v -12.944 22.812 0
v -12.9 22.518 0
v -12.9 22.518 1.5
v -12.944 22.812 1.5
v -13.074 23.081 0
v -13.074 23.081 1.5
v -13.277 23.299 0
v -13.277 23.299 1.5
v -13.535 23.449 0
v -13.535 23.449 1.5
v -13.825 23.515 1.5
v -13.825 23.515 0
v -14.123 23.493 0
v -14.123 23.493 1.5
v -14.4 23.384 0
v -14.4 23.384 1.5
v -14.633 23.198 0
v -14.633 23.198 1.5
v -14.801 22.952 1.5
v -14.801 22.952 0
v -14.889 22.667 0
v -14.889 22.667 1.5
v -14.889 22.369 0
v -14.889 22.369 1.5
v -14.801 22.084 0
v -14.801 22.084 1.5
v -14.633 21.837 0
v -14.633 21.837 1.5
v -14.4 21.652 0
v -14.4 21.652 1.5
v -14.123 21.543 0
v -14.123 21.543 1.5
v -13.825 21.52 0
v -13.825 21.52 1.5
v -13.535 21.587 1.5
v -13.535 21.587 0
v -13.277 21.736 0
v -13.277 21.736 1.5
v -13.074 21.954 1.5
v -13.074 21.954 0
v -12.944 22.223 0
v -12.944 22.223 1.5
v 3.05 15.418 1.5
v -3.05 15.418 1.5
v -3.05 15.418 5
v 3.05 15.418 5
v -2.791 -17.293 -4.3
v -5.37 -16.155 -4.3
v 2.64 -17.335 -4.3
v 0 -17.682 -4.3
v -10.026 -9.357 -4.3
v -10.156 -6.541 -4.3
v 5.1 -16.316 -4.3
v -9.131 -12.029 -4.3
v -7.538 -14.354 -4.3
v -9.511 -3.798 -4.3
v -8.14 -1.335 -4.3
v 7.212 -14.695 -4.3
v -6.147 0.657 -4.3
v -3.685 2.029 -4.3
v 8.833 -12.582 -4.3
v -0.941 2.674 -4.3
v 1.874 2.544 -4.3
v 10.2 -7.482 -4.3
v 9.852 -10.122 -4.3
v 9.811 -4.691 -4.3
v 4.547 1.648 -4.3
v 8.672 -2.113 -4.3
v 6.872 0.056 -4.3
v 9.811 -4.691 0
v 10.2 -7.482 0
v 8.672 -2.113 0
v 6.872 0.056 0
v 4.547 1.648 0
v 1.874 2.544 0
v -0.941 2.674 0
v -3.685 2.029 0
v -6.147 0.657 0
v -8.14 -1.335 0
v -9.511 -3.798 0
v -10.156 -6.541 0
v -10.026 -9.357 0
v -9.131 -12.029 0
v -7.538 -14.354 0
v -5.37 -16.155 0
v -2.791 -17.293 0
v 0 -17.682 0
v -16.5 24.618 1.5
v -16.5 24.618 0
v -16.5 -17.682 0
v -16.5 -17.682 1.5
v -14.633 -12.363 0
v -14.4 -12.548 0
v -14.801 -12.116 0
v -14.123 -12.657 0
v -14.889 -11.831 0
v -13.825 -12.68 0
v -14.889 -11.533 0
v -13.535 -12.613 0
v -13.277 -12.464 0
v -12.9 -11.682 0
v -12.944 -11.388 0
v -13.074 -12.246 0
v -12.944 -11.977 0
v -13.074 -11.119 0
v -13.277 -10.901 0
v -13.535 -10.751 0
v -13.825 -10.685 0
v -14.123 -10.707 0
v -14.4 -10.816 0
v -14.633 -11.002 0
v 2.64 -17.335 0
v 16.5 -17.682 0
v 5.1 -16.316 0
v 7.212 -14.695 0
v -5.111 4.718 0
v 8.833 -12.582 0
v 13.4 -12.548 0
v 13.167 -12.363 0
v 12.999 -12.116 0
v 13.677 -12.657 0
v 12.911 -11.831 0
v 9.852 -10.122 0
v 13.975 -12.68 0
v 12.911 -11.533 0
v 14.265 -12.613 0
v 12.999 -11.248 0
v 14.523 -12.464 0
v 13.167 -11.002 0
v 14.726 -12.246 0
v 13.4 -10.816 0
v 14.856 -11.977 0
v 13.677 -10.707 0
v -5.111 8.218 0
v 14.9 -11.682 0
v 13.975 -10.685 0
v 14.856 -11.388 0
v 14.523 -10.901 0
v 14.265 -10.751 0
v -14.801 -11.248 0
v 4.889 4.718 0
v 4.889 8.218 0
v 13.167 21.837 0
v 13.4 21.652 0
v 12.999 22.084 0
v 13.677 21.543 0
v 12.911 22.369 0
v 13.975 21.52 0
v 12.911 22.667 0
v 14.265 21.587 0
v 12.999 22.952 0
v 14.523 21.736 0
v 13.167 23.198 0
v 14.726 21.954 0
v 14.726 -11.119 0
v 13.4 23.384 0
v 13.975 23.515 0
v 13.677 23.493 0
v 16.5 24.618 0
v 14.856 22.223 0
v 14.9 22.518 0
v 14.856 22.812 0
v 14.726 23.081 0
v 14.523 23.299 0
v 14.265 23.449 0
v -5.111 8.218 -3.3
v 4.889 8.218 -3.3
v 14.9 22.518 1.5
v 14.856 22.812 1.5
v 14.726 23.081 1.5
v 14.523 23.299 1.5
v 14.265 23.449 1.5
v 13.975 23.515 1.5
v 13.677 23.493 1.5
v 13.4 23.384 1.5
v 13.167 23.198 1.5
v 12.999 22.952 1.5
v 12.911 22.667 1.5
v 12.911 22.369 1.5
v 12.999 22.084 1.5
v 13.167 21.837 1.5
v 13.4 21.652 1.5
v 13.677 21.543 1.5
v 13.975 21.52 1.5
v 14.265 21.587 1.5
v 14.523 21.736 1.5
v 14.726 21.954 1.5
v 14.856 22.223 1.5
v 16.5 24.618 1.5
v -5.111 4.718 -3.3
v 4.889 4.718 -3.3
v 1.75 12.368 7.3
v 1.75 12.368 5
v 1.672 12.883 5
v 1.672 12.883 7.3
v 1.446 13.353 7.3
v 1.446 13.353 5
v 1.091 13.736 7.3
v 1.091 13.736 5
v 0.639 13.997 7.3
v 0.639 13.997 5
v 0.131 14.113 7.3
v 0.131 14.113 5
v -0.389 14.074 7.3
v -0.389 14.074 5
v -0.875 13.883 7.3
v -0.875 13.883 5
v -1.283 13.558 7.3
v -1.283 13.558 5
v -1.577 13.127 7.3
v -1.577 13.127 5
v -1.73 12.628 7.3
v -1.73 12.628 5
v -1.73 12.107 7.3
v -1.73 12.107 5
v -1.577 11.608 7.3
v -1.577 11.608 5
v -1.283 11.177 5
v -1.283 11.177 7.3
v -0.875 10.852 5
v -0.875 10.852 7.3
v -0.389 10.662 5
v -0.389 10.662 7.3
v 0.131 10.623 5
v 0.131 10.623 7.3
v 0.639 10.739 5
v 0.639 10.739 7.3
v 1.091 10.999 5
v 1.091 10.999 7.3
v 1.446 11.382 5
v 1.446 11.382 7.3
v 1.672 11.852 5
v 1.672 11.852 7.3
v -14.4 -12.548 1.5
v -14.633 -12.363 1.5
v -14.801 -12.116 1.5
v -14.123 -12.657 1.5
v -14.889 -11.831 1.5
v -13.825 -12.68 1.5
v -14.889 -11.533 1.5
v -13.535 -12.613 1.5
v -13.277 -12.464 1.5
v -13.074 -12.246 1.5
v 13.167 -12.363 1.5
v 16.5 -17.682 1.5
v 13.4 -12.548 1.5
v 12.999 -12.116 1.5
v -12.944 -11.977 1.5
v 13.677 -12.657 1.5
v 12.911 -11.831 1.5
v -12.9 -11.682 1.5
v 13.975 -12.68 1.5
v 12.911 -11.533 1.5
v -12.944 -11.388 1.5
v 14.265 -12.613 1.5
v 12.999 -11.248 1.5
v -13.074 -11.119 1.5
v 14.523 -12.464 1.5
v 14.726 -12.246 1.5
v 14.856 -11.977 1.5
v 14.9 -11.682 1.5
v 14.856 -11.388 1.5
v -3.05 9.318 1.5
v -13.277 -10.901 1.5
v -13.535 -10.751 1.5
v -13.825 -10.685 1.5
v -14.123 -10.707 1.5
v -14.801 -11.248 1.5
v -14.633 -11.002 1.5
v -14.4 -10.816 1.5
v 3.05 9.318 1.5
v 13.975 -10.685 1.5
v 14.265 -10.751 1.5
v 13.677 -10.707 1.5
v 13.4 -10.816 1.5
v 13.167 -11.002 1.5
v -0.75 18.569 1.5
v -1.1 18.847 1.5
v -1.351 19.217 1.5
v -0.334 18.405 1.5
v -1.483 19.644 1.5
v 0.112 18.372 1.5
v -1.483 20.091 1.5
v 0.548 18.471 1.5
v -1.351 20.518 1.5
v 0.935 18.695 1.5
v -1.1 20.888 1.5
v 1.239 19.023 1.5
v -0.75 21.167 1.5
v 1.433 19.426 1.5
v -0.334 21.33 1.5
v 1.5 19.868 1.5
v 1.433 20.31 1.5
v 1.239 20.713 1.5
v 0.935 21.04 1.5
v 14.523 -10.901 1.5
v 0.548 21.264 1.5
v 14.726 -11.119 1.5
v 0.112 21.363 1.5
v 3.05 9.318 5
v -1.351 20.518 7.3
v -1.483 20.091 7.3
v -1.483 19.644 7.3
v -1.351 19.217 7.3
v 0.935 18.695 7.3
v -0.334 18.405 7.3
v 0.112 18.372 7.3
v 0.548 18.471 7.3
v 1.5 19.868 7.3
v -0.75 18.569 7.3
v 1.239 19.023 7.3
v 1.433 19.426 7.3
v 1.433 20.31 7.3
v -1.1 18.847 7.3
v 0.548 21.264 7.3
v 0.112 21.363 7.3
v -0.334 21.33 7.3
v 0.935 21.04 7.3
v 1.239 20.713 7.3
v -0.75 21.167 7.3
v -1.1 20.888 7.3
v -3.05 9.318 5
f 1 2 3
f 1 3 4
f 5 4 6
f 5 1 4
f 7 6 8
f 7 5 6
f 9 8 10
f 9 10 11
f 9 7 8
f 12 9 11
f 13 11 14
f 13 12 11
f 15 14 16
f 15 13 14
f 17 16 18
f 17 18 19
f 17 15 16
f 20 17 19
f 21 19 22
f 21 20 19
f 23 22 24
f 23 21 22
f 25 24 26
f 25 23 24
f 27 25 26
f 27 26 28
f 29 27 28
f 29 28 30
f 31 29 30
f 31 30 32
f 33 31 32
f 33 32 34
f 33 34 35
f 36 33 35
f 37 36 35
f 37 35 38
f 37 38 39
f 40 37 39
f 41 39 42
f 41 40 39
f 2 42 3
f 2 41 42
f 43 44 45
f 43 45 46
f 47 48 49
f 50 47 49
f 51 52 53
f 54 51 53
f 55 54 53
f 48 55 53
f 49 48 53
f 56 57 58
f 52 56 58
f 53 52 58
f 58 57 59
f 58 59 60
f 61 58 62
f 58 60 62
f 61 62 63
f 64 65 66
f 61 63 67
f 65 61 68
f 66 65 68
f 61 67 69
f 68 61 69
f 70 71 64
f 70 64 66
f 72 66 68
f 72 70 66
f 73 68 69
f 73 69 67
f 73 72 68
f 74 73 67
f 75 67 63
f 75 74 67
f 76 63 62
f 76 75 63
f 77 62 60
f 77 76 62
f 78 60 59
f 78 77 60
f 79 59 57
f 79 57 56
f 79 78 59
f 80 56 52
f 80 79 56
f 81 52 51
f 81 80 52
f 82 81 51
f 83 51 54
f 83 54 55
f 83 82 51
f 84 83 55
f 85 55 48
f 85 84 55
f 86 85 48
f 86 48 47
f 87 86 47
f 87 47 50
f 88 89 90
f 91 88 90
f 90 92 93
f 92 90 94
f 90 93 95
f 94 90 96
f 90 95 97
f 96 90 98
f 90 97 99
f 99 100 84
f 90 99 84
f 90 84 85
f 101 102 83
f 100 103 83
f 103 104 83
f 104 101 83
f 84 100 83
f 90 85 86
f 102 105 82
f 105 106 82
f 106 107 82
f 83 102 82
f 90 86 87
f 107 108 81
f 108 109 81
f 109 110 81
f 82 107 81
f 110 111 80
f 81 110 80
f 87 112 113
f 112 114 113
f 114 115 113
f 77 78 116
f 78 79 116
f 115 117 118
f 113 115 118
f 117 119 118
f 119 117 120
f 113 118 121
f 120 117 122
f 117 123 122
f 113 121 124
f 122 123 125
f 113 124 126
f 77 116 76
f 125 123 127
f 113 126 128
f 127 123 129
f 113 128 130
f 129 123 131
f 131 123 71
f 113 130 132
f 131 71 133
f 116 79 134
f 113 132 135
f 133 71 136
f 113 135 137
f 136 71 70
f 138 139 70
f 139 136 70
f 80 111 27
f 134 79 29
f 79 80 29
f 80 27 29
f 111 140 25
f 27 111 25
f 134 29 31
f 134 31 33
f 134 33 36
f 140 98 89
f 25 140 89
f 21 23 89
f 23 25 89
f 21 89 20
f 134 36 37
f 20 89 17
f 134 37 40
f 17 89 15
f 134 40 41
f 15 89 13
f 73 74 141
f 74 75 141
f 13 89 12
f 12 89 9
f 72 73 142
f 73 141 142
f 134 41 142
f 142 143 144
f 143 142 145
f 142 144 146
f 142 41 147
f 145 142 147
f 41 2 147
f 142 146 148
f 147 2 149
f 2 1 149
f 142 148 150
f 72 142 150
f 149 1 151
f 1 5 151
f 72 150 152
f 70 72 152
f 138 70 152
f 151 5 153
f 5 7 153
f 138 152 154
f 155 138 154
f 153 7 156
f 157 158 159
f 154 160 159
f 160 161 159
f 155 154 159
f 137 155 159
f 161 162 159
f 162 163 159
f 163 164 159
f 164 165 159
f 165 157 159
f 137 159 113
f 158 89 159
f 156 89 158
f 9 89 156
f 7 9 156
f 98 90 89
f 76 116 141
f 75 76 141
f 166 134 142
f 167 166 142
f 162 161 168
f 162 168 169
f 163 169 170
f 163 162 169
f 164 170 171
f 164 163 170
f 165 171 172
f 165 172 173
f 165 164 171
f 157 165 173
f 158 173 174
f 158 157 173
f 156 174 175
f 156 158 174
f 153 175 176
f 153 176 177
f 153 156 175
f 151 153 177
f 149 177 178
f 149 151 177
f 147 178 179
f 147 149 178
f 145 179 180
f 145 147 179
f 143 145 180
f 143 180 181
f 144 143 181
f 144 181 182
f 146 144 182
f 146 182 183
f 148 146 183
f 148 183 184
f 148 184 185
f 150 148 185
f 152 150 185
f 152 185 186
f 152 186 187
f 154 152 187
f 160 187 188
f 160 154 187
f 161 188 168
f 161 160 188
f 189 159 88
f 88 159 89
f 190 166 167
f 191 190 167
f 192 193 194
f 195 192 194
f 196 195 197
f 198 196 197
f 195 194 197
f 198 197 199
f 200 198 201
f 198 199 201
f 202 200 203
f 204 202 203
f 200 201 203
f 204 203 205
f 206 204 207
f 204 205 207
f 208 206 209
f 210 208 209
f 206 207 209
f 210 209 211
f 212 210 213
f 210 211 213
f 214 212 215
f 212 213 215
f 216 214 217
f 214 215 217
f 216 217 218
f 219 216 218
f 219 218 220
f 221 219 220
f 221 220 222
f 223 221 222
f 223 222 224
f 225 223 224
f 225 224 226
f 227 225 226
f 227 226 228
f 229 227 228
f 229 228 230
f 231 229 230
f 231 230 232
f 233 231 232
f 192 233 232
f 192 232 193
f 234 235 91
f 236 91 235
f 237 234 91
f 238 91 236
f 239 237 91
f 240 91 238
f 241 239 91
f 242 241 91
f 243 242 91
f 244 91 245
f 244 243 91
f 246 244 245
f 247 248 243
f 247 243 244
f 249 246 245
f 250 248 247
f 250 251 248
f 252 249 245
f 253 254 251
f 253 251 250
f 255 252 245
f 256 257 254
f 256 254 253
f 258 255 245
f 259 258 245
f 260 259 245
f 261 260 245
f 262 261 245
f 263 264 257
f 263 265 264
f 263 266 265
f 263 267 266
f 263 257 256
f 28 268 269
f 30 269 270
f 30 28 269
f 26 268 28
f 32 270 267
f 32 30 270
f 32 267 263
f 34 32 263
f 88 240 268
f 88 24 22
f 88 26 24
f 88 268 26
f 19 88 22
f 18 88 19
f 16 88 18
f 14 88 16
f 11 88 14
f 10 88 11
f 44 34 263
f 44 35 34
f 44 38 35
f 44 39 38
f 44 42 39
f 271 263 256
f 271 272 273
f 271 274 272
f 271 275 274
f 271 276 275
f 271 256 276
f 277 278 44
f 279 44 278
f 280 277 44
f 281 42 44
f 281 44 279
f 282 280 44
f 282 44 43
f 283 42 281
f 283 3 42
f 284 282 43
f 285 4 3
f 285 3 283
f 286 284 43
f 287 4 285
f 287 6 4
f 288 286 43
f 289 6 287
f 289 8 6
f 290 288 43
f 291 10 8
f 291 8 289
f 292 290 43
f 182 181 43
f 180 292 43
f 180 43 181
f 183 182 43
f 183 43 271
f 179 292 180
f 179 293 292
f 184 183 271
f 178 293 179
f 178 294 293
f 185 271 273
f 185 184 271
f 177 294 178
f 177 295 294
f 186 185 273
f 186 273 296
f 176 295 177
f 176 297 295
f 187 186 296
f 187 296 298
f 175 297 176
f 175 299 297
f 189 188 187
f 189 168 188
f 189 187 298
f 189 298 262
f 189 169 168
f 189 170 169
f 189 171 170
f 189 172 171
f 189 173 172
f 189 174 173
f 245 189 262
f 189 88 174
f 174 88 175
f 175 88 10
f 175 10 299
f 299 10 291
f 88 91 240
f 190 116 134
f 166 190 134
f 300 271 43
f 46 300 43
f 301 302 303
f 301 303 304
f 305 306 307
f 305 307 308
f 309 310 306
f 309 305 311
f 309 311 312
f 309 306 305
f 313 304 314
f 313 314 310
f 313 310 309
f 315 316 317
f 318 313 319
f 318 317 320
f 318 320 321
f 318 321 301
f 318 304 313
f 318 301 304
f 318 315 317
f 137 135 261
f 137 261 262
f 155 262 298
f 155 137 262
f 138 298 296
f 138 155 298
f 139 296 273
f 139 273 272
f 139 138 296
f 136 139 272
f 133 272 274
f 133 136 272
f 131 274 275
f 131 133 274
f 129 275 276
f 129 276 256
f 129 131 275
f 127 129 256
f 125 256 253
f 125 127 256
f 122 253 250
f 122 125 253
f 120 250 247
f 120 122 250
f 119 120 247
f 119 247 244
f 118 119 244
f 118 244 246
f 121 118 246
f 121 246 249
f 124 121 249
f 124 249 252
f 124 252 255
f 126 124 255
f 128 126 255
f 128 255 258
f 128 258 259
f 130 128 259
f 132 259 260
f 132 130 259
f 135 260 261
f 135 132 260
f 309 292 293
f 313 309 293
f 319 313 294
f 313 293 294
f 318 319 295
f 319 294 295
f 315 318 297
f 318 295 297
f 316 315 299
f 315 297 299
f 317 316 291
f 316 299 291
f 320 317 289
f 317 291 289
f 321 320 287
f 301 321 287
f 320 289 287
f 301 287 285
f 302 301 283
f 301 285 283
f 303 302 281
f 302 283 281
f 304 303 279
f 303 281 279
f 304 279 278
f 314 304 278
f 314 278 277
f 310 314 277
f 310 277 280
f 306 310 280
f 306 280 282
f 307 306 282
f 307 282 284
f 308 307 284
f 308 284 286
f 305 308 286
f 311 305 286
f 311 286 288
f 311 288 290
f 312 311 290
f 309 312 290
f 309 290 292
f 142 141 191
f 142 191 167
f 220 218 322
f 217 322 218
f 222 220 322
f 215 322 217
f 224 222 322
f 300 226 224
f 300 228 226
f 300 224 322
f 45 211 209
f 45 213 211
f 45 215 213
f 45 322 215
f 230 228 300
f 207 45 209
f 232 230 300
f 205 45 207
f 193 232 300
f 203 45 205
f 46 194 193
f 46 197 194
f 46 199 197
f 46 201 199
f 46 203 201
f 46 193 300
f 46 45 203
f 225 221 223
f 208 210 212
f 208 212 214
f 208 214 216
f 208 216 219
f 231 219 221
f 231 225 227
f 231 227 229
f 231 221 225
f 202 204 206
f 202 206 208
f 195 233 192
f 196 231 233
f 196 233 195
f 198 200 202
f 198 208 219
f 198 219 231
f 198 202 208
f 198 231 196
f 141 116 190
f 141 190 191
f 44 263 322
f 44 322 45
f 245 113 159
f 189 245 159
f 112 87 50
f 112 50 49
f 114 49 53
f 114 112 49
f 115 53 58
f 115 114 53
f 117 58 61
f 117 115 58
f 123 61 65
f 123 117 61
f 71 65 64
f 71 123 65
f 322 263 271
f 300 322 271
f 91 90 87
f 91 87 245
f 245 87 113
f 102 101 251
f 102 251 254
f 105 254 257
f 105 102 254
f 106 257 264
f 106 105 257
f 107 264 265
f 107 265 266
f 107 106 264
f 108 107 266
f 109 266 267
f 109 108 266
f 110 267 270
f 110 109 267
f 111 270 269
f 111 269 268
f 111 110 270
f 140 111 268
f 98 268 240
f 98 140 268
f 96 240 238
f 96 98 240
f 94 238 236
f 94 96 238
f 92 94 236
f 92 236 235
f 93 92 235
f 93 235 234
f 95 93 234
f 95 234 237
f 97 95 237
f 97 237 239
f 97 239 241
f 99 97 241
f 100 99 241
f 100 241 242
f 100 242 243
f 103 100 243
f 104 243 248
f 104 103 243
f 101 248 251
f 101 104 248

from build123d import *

# Parameters (mm, degrees)
F0_R     = 1
F0_W     = 10
F0_H     = 3.5
F0_W_2   = 6.1
F0_H_2   = 6.1
F0_R_2   = 1.5
F0_R_3   = 1.75
F1_DEPTH = 1.5
F2_DEPTH = 4.3
F3_DEPTH = 7.3
F4_DEPTH = 5
F5_DEPTH = 3.3


with BuildPart() as f1:
    # F0 (on Top) → F1 (new body)
    with BuildSketch(Plane.XY):
        Polygon((16.5, 24.617638), (-16.5, 24.617638), (-16.5, -17.682362), (0, -17.682362), (16.5, -17.682362), align=None)
        with Locations((-13.9, -11.682362)):
            Circle(F0_R, mode=Mode.SUBTRACT)
        with BuildLine():
            ThreePointArc((10.2, -7.482362), (7.212489, -14.694851), (0, -17.682362))
            ThreePointArc((0, -17.682362), (-7.212489, -0.269872), (10.2, -7.482362))
        make_face(mode=Mode.SUBTRACT)
        with Locations((13.9, -11.682362)):
            Circle(F0_R, mode=Mode.SUBTRACT)
        with Locations((-0.111425, 6.467638)):
            Rectangle(F0_W, F0_H, mode=Mode.SUBTRACT)
        with Locations((-13.9, 22.517638)):
            Circle(F0_R, mode=Mode.SUBTRACT)
        with Locations((0, 12.367638)):
            Rectangle(F0_W_2, F0_H_2, mode=Mode.SUBTRACT)
        with Locations((0, 19.867638)):
            Circle(F0_R_2, mode=Mode.SUBTRACT)
        with Locations((13.9, 22.517638)):
            Circle(F0_R, mode=Mode.SUBTRACT)
        with BuildLine():
            ThreePointArc((10.2, -7.482362), (-7.212489, -0.269872), (0, -17.682362))
            ThreePointArc((0, -17.682362), (7.212489, -14.694851), (10.2, -7.482362))
        make_face()
        with Locations((0, 19.867638)):
            Circle(F0_R_2)
        with Locations((0, 12.367638)):
            Rectangle(F0_W_2, F0_H_2)
        with Locations((0, 12.367638)):
            Circle(F0_R_3, mode=Mode.SUBTRACT)
        with Locations((0, 12.367638)):
            Circle(F0_R_3)
        with Locations((-0.111425, 6.467638)):
            Rectangle(F0_W, F0_H)
    extrude(amount=F1_DEPTH)

    # F0 (on Top) → F2 (join)
    with BuildSketch(Plane.XY):
        with BuildLine():
            ThreePointArc((10.2, -7.482362), (-7.212489, -0.269872), (0, -17.682362))
            ThreePointArc((0, -17.682362), (7.212489, -14.694851), (10.2, -7.482362))
        make_face()
    extrude(amount=-F2_DEPTH)

    # F0 (on Top) → F3 (join)
    with BuildSketch(Plane.XY):
        with Locations((0, 19.867638)):
            Circle(F0_R_2)
        with Locations((0, 12.367638)):
            Circle(F0_R_3)
    extrude(amount=F3_DEPTH)

    # F0 (on Top) → F4 (join)
    with BuildSketch(Plane.XY):
        with Locations((0, 12.367638)):
            Rectangle(F0_W_2, F0_H_2)
        with Locations((0, 12.367638)):
            Circle(F0_R_3, mode=Mode.SUBTRACT)
    extrude(amount=F4_DEPTH)

    # F0 (on Top) → F5 (join)
    with BuildSketch(Plane.XY):
        with Locations((-0.111425, 6.467638)):
            Rectangle(F0_W, F0_H)
    extrude(amount=-F5_DEPTH)


solid = f1.part
